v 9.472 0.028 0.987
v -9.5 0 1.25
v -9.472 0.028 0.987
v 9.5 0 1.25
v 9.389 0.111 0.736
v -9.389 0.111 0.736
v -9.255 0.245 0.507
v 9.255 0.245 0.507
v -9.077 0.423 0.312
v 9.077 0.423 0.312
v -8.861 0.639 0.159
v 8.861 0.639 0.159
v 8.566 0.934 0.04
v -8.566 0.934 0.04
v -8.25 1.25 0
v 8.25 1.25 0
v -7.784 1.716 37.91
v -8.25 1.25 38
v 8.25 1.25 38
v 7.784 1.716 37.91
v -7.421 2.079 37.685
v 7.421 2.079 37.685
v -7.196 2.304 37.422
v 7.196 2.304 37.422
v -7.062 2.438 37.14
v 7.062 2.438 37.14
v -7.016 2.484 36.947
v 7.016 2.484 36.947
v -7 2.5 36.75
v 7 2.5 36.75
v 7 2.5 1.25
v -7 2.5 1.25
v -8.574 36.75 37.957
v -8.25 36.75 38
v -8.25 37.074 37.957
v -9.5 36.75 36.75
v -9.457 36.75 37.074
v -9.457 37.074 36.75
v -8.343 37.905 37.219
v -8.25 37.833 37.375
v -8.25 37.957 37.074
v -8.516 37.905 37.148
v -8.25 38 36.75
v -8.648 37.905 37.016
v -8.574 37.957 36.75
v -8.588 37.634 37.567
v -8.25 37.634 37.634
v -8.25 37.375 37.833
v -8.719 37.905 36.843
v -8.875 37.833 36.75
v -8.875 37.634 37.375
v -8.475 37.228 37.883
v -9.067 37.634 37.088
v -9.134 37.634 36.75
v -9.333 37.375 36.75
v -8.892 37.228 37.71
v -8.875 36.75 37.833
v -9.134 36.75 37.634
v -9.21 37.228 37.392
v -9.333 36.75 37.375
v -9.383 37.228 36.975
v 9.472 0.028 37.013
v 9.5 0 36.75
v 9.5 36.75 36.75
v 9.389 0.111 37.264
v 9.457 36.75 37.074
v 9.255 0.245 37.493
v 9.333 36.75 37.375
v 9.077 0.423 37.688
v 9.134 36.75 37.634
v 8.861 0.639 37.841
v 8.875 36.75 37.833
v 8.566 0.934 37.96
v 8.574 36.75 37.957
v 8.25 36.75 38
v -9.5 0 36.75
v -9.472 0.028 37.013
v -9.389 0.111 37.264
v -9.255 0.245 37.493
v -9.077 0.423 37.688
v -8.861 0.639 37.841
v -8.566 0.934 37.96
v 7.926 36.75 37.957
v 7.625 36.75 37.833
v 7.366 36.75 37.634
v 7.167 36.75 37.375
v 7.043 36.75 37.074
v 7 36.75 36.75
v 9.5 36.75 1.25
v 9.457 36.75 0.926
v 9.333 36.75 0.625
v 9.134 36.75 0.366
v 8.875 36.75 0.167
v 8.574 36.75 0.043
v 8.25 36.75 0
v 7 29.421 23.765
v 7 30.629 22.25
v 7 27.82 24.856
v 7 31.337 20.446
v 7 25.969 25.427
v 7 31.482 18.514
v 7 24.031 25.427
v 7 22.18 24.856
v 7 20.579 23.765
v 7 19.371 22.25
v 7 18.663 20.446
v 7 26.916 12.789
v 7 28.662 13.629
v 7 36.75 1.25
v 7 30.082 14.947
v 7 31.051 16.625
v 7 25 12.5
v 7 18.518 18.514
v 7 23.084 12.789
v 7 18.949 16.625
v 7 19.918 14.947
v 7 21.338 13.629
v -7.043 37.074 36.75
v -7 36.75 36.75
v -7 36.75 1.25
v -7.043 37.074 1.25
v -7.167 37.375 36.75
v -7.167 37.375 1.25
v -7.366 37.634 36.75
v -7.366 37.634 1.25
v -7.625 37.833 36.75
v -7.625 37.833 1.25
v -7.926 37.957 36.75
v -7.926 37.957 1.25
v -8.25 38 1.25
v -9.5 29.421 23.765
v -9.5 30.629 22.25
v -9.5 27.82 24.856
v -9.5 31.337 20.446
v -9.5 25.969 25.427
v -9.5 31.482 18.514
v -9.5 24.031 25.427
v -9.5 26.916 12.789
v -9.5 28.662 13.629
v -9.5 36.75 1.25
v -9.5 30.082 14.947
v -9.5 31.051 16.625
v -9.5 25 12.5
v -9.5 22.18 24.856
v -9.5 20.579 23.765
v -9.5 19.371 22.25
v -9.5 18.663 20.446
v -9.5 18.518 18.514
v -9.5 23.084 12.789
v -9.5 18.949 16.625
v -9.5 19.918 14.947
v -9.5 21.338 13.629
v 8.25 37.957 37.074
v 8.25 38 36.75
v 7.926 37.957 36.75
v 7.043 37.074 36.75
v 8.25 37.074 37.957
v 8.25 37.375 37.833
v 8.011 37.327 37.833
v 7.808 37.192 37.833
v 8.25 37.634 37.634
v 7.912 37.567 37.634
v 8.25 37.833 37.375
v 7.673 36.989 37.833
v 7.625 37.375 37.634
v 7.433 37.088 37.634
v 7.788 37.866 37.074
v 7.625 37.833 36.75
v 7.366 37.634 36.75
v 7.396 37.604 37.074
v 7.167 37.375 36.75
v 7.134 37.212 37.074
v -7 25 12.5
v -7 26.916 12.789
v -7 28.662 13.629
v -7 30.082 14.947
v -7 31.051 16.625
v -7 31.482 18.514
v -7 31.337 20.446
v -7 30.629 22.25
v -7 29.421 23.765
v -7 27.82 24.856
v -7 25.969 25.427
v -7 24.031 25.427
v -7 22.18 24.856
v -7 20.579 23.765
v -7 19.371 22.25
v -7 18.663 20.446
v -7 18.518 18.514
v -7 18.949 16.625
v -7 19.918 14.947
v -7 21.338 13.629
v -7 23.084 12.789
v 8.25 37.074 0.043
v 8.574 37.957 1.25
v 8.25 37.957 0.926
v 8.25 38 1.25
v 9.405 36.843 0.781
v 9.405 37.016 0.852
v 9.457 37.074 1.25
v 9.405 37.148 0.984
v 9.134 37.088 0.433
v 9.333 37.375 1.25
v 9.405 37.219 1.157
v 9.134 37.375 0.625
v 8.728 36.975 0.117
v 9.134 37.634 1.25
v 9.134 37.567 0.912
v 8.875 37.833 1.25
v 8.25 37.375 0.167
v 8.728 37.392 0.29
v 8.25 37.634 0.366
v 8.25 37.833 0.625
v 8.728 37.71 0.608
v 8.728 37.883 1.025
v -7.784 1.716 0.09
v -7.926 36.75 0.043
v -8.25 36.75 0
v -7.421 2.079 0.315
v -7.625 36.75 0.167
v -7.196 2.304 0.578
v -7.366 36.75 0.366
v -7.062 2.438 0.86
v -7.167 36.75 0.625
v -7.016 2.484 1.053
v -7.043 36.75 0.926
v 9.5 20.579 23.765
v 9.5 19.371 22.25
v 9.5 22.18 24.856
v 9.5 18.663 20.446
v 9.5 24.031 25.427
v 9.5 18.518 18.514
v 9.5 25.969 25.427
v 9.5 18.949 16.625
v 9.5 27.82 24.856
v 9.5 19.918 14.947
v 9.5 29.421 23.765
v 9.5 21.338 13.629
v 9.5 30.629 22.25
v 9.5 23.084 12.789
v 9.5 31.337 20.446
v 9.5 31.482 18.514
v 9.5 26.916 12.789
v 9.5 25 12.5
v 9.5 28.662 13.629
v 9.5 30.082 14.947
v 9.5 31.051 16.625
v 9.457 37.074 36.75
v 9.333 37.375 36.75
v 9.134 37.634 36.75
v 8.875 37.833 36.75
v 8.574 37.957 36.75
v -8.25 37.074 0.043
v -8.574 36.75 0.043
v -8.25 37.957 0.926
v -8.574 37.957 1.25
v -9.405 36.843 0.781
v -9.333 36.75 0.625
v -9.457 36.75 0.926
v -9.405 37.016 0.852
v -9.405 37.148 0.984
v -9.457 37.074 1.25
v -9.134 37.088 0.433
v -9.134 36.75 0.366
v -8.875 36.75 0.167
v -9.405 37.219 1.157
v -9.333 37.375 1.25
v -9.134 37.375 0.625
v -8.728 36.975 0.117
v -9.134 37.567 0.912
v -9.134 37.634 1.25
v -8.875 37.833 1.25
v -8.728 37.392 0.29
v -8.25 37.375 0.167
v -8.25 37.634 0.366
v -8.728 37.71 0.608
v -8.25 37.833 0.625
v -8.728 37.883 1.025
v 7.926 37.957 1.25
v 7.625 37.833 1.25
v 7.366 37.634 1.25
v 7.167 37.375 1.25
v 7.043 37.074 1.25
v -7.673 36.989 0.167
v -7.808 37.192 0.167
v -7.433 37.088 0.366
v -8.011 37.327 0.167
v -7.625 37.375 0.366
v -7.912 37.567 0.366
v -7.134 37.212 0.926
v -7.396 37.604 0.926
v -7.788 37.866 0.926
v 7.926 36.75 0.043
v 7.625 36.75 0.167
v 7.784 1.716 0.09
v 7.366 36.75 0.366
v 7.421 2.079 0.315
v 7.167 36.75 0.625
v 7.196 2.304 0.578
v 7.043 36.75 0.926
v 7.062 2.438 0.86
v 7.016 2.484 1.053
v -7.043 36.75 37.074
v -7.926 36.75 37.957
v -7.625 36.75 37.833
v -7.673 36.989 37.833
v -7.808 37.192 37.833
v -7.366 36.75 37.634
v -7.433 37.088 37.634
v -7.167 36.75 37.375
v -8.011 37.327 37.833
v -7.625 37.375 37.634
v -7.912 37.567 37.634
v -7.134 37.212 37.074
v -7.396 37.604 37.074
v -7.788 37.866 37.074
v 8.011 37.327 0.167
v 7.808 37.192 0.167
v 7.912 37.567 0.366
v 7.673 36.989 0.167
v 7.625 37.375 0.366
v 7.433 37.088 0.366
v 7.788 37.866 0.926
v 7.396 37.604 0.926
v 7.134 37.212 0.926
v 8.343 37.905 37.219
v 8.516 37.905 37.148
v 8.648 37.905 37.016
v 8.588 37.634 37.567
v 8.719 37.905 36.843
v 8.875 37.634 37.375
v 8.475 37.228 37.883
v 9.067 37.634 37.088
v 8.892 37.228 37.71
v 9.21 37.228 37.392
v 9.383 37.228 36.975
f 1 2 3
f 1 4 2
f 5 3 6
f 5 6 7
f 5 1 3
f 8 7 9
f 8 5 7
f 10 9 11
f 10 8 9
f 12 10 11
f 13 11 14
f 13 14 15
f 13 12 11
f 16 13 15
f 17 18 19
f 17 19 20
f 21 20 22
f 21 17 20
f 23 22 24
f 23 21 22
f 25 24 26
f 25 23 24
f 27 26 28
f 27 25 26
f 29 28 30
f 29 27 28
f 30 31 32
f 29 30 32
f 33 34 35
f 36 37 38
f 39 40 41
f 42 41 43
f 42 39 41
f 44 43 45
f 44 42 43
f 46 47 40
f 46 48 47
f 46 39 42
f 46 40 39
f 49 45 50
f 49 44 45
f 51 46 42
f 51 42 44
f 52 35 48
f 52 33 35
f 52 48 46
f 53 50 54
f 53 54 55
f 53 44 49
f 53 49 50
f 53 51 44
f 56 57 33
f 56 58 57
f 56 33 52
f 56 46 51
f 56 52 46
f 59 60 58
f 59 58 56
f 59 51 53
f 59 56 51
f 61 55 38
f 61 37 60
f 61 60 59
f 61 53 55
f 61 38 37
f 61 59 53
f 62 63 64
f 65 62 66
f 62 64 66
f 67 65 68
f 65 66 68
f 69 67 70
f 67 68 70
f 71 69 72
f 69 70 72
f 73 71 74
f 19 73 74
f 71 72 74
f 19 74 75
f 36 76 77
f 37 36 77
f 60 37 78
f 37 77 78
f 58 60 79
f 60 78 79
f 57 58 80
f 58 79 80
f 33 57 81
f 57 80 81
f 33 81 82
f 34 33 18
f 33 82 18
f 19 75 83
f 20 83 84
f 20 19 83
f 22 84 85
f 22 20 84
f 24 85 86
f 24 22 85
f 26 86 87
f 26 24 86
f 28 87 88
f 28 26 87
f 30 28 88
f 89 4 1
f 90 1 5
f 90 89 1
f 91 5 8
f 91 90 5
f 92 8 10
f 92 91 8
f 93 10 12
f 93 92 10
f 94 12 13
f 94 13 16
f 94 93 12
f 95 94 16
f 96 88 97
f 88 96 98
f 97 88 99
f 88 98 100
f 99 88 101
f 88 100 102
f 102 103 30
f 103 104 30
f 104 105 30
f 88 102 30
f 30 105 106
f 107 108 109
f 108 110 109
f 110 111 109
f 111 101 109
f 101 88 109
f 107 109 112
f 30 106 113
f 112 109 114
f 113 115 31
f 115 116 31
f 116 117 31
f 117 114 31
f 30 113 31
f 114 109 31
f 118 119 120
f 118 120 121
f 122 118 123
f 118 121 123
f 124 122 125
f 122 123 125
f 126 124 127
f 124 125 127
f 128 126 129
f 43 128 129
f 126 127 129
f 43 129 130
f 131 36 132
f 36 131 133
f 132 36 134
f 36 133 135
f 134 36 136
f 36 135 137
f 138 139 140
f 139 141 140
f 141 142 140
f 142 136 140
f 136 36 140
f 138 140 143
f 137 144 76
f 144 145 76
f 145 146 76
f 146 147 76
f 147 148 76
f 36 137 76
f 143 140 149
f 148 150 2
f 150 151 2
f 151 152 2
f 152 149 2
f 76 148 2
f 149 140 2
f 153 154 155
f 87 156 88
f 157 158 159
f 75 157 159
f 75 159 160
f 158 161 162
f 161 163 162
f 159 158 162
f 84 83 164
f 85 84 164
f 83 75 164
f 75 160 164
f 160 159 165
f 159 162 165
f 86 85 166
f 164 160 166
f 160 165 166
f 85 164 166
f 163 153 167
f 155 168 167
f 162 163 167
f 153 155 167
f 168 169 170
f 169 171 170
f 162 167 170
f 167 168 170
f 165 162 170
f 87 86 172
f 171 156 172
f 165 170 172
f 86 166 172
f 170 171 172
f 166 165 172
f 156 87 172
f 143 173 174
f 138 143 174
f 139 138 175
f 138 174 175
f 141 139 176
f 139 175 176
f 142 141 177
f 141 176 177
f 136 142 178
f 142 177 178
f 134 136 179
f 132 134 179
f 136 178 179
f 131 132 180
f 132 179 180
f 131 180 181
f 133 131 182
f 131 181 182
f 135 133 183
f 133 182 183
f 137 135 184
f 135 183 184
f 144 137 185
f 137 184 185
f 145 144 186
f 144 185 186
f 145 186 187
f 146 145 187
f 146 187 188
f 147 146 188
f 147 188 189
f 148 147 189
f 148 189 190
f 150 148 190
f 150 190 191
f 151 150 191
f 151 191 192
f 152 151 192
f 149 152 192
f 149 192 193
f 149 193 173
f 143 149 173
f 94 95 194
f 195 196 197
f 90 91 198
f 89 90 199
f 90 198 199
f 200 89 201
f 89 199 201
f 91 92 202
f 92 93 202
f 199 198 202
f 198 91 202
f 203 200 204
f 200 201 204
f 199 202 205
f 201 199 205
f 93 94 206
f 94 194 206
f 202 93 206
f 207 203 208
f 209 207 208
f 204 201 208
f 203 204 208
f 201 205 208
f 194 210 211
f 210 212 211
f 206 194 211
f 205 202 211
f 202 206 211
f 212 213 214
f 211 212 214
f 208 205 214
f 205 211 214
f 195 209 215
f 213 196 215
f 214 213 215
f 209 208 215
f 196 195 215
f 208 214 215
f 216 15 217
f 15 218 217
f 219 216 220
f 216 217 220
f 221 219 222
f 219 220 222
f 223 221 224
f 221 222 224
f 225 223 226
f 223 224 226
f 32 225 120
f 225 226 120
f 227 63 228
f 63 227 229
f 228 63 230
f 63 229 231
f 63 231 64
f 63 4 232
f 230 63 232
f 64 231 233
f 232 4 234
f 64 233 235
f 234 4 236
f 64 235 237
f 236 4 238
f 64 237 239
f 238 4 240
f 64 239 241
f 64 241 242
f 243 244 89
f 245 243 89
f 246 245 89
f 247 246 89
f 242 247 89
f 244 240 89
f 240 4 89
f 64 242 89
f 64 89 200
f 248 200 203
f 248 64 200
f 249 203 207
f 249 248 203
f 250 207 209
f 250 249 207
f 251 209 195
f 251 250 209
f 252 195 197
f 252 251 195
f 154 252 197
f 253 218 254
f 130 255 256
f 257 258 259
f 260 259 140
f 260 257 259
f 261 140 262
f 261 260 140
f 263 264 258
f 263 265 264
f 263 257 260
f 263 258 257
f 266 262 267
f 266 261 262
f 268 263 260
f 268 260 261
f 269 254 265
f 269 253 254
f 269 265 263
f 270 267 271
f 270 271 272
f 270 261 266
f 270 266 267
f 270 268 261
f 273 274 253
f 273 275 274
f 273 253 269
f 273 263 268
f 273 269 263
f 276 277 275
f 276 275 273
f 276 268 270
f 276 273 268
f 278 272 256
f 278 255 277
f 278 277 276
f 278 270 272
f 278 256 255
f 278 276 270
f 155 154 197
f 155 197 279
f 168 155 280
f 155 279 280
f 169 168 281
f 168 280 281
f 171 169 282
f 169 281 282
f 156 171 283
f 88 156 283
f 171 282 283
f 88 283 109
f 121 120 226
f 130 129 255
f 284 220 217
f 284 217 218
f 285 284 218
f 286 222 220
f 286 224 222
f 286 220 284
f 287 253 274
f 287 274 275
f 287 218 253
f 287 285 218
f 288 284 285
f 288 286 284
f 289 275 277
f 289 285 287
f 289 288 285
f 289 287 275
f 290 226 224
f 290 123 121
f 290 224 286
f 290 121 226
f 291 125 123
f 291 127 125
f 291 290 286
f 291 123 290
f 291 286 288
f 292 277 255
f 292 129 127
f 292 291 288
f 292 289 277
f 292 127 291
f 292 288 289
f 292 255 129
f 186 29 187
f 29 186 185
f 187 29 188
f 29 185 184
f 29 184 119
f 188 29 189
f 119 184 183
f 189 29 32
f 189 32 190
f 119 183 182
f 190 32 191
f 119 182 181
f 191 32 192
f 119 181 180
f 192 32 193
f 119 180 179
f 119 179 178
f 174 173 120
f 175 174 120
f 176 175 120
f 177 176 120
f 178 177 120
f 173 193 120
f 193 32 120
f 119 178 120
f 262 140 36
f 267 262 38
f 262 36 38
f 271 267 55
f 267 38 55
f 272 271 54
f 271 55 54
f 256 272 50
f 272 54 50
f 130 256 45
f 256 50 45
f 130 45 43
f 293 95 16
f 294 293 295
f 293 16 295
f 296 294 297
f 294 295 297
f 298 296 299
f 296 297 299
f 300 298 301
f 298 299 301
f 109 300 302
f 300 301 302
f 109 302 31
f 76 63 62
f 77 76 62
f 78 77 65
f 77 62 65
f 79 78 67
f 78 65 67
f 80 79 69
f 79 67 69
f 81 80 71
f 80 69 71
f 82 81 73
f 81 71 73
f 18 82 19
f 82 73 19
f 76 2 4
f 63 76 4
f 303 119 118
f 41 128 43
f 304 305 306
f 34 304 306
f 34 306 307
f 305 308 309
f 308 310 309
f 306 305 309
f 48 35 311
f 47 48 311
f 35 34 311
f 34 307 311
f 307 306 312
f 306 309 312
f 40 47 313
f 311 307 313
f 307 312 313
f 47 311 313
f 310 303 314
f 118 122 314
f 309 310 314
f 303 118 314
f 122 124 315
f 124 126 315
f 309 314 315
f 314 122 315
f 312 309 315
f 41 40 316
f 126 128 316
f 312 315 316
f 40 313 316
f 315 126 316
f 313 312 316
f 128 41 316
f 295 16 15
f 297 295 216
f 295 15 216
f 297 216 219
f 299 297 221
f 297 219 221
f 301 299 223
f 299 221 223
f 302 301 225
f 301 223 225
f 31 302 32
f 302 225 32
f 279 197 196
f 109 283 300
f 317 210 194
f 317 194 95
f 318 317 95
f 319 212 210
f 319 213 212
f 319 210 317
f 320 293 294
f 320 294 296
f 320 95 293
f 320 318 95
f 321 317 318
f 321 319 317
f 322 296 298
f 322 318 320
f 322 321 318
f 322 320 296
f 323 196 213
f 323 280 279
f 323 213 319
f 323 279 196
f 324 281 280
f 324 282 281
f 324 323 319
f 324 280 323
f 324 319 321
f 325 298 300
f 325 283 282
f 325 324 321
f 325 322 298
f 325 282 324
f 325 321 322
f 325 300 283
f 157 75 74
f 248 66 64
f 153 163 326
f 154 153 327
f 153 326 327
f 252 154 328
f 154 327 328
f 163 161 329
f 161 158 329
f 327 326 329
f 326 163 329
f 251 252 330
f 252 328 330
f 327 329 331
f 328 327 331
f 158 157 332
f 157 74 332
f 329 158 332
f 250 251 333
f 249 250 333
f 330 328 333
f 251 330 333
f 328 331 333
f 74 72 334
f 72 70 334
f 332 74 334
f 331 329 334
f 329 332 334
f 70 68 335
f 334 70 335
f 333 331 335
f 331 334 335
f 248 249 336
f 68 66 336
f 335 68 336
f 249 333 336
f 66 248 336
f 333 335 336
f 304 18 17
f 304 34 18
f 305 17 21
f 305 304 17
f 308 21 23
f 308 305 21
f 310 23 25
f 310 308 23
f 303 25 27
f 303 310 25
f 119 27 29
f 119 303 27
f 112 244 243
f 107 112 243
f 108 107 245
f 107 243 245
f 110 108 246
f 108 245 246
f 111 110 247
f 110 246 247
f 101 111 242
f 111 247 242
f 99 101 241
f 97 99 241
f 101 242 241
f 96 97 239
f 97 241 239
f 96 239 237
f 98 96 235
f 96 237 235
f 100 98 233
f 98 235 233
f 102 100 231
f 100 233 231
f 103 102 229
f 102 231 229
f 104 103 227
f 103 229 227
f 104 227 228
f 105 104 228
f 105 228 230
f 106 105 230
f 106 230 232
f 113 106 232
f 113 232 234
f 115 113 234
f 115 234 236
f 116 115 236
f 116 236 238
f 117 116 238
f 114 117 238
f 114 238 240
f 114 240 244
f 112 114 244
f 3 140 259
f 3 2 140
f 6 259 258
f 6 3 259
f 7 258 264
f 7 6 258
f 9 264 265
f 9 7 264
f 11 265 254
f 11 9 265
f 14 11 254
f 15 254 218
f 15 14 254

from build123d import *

# Parameters (mm, degrees)
BOSS_EXTRUDE1_DEPTH = 38
SKETCH2_R           = 6.5
CUT_EXTRUDE1_DEPTH  = 58
FILLET1_R           = 1.25


with BuildPart() as part:
    # Sketch1 → Boss-Extrude1 (new body)
    with BuildSketch(Plane.XY):
        with BuildLine():
            Line((-9.5, 0), (9.5, 0))
            Line((9.5, 0), (9.5, 38))
            Line((9.5, 38), (8.25, 38))
            ThreePointArc((8.25, 38), (7.366116524, 37.633883476), (7, 36.75))
            Line((7, 36.75), (7, 2.5))
            Line((7, 2.5), (-7, 2.5))
            Line((-7, 2.5), (-7, 36.75))
            ThreePointArc((-7, 36.75), (-7.366116524, 37.633883476), (-8.25, 38))
            Line((-8.25, 38), (-9.5, 38))
            Line((-9.5, 38), (-9.5, 0))
        make_face()
    extrude(amount=BOSS_EXTRUDE1_DEPTH)

    # Sketch2 → Cut-Extrude1 (cut, through all)
    with BuildSketch(Plane(origin=(9.5, 0, 0), x_dir=(0, 0, -1), z_dir=(1, 0, 0))):
        with Locations((-19, 25)):
            Circle(SKETCH2_R)
    extrude(amount=-CUT_EXTRUDE1_DEPTH, mode=Mode.SUBTRACT)

    # Fillet1
    fillet1_edges = [part.edges().sort_by_distance(p)[0] for p in [
        (7.366116524, 37.633883476, 0),
        (-7.366116524, 37.633883476, 0),
        (9.5, 19, 38),
        (0, 0, 38),
        (-9.5, 19, 38),
        (-7.366116524, 37.633883476, 38),
        (-7, 19.625, 38),
        (0, 2.5, 38),
        (7, 19.625, 38),
        (7.366116524, 37.633883476, 38),
        (7, 19.625, 0),
        (9.5, 19, 0),
        (0, 0, 0),
        (0, 2.5, 0),
        (-7, 19.625, 0),
        (-9.5, 19, 0),
        (-9.5, 38, 19),
        (9.5, 38, 19),
    ]]
    fillet(fillet1_edges, radius=FILLET1_R - 0.0001)  # a hair under: the kernel refuses the full size


solid = part.part
